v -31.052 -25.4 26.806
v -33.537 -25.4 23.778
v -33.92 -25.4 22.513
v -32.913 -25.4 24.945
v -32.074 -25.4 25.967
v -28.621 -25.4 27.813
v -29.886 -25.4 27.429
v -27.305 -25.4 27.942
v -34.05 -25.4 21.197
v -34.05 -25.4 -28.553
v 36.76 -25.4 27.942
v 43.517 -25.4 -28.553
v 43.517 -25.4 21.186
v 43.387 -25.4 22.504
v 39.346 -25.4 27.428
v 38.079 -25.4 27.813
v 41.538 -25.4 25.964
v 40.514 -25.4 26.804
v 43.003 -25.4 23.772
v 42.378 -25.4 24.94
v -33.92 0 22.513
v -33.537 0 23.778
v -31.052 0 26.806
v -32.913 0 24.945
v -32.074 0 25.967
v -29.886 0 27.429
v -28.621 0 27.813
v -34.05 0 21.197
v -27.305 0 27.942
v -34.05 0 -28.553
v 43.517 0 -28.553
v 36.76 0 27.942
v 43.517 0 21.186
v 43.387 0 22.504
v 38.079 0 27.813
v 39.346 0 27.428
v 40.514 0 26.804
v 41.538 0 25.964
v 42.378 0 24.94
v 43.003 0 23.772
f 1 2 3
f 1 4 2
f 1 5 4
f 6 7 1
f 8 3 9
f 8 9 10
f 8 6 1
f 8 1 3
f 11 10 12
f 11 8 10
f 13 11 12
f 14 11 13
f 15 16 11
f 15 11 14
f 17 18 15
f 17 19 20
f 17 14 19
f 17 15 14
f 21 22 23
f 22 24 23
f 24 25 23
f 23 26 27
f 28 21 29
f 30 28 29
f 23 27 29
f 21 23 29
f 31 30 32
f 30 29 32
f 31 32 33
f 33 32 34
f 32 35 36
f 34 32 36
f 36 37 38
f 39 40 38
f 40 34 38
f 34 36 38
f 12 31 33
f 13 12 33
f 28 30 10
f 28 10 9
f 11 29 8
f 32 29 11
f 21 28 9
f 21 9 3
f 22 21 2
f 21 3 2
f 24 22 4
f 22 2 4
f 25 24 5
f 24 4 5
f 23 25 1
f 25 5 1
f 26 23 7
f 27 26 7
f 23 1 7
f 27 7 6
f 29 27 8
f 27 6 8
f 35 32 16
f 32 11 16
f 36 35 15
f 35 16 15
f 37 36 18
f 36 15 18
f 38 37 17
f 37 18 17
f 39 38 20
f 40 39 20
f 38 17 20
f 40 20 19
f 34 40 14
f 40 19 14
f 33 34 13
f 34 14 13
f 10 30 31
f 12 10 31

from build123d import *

# Parameters (mm, degrees)
F0_W     = 77.566948
F0_H     = 56.495611
F1_DEPTH = 25.4
F2_R     = 8.919249
F3_DEPTH = 25.4
F4_R     = 6.745313
F5_R     = 6.7564


with BuildPart() as f1:
    # F0 (on Front) → F1 (new body)
    with BuildSketch(Plane.XZ):
        with Locations((4.733415, -0.305383)):
            Rectangle(F0_W, F0_H)
    extrude(amount=F1_DEPTH)

    # F2 (on face) → F3 (join)
    with BuildSketch(Plane.XZ.offset(25.4)):
        Circle(F2_R)
    extrude(amount=-F3_DEPTH)

    # F4
    f4_edges = [f1.edges().sort_by_distance(p)[0] for p in [
        (-34.050059, -12.7, 27.942423),
    ]]
    fillet(f4_edges, radius=F4_R)

    # F5
    f5_edges = [f1.edges().sort_by_distance(p)[0] for p in [
        (43.516889, -12.7, 27.942423),
    ]]
    fillet(f5_edges, radius=F5_R)


solid = f1.part
